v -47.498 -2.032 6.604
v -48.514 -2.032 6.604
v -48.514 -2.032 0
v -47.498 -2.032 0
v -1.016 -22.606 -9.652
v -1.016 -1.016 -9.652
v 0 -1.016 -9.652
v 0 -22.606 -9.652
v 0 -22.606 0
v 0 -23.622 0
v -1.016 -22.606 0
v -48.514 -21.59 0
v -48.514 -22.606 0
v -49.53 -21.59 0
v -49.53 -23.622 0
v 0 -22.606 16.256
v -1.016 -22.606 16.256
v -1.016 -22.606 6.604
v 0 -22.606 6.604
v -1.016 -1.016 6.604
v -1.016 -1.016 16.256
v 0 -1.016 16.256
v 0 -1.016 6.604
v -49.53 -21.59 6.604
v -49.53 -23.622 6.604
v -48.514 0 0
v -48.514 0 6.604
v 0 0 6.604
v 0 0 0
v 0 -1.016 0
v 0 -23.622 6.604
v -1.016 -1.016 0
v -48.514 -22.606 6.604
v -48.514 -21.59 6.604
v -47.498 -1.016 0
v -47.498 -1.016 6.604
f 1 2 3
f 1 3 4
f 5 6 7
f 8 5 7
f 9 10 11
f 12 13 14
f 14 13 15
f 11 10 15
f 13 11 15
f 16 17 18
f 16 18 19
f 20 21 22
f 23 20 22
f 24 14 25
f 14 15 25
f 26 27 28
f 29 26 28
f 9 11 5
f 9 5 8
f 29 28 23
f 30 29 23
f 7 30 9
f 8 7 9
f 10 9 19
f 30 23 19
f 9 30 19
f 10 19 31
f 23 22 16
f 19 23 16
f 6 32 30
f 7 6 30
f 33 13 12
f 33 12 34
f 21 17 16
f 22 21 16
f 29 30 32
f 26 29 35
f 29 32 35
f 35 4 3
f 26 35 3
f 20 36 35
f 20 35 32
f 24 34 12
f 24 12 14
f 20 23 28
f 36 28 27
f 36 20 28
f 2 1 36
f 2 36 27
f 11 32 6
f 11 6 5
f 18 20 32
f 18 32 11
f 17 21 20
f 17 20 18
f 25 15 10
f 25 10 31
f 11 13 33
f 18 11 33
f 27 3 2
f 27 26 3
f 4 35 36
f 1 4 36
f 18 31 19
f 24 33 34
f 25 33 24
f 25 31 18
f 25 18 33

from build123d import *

# Parameters (mm, degrees)
F0_W       = 46.99
F0_H       = 6.604
F1_DEPTH   = 1.016
F2_W       = 0.508
F2_H       = 6.604
F2_W_2     = 1.016
F3_DEPTH   = 1.016
F4_W       = 1.016
F4_H       = 6.604
F5_DEPTH   = 1.016
F6_W       = 1.016
F6_H       = 6.604
F7_DEPTH   = 21.59
F7_FACE_W  = 1.016
F7_FACE_H  = 6.604
F8_DEPTH   = 1.016
F9_W       = 1.016
F9_H       = 6.604
F10_DEPTH  = 46.99
F10_FACE_W = 1.016
F10_FACE_H = 6.604
F11_DEPTH  = 1.524
F12_W      = 1.016
F12_H      = 6.604
F13_DEPTH  = 1.016
F14_W      = 1.016
F14_H      = 21.59
F16_DEPTH  = 9.652
F17_W      = 1.016
F17_H      = 21.59
F18_DEPTH  = 9.652


with BuildPart() as f1:
    # F0 (on Front) → F1 (new body)
    with BuildSketch(Plane.XZ):
        with Locations((-23.495, 3.302)):
            Rectangle(F0_W, F0_H)
    extrude(amount=F1_DEPTH)

    # F2 (on face) → F3 (join)
    with BuildSketch(Plane.XZ.offset(1.016)):
        with Locations((-47.244, 3.302)):
            Rectangle(F2_W, F2_H)
        with Locations((-48.006, 3.302)):
            Rectangle(F2_W_2, F2_H)
    extrude(amount=-F3_DEPTH)

    # F4 (on face) → F5 (join)
    with BuildSketch(Plane.XZ.offset(1.016)):
        with Locations((-48.006, 3.302)):
            Rectangle(F4_W, F4_H)
    extrude(amount=F5_DEPTH)

    # F6 (on face) → F7 (join)
    with BuildSketch(Plane.XZ.offset(1.016)):
        with Locations((-0.508, 3.302)):
            Rectangle(F6_W, F6_H)
    extrude(amount=F7_DEPTH)

    # F7_face (on face) → F8 (join)
    with BuildSketch(Plane(origin=(-0.508, -22.606, 3.302), x_dir=(1, 0, 0), z_dir=(0, -1, 0))):
        Rectangle(F7_FACE_W, F7_FACE_H)
    extrude(amount=F8_DEPTH)

    # F9 (on face) → F10 (join)
    with BuildSketch(Plane(origin=(-1.016, 0, 0), x_dir=(0, -1, 0), z_dir=(-1, 0, 0))):
        with Locations((23.114, 3.302)):
            Rectangle(F9_W, F9_H)
    extrude(amount=F10_DEPTH)

    # F10_face (on face) → F11 (join)
    with BuildSketch(Plane(origin=(-48.006, -23.114, 3.302), x_dir=(0, -1, 0), z_dir=(-1, 0, 0))):
        Rectangle(F10_FACE_W, F10_FACE_H)
    extrude(amount=F11_DEPTH)

    # F12 (on face) → F13 (join)
    with BuildSketch(Plane(origin=(0, -22.606, 0), x_dir=(-1, 0, 0), z_dir=(0, 1, 0))):
        with Locations((49.022, 3.302)):
            Rectangle(F12_W, F12_H)
    extrude(amount=F13_DEPTH)

    # F14 (on face) → F16 (join)
    with BuildSketch(Plane.XY.offset(6.604)):
        with Locations((-0.508, -11.811)):
            Rectangle(F14_W, F14_H)
    extrude(amount=F16_DEPTH)

    # F17 (on face) → F18 (join)
    with BuildSketch(Plane(origin=(0, 0, 0), x_dir=(1, 0, 0), z_dir=(0, 0, -1))):
        with Locations((-0.508, 11.811)):
            Rectangle(F17_W, F17_H)
    extrude(amount=F18_DEPTH)


solid = f1.part
